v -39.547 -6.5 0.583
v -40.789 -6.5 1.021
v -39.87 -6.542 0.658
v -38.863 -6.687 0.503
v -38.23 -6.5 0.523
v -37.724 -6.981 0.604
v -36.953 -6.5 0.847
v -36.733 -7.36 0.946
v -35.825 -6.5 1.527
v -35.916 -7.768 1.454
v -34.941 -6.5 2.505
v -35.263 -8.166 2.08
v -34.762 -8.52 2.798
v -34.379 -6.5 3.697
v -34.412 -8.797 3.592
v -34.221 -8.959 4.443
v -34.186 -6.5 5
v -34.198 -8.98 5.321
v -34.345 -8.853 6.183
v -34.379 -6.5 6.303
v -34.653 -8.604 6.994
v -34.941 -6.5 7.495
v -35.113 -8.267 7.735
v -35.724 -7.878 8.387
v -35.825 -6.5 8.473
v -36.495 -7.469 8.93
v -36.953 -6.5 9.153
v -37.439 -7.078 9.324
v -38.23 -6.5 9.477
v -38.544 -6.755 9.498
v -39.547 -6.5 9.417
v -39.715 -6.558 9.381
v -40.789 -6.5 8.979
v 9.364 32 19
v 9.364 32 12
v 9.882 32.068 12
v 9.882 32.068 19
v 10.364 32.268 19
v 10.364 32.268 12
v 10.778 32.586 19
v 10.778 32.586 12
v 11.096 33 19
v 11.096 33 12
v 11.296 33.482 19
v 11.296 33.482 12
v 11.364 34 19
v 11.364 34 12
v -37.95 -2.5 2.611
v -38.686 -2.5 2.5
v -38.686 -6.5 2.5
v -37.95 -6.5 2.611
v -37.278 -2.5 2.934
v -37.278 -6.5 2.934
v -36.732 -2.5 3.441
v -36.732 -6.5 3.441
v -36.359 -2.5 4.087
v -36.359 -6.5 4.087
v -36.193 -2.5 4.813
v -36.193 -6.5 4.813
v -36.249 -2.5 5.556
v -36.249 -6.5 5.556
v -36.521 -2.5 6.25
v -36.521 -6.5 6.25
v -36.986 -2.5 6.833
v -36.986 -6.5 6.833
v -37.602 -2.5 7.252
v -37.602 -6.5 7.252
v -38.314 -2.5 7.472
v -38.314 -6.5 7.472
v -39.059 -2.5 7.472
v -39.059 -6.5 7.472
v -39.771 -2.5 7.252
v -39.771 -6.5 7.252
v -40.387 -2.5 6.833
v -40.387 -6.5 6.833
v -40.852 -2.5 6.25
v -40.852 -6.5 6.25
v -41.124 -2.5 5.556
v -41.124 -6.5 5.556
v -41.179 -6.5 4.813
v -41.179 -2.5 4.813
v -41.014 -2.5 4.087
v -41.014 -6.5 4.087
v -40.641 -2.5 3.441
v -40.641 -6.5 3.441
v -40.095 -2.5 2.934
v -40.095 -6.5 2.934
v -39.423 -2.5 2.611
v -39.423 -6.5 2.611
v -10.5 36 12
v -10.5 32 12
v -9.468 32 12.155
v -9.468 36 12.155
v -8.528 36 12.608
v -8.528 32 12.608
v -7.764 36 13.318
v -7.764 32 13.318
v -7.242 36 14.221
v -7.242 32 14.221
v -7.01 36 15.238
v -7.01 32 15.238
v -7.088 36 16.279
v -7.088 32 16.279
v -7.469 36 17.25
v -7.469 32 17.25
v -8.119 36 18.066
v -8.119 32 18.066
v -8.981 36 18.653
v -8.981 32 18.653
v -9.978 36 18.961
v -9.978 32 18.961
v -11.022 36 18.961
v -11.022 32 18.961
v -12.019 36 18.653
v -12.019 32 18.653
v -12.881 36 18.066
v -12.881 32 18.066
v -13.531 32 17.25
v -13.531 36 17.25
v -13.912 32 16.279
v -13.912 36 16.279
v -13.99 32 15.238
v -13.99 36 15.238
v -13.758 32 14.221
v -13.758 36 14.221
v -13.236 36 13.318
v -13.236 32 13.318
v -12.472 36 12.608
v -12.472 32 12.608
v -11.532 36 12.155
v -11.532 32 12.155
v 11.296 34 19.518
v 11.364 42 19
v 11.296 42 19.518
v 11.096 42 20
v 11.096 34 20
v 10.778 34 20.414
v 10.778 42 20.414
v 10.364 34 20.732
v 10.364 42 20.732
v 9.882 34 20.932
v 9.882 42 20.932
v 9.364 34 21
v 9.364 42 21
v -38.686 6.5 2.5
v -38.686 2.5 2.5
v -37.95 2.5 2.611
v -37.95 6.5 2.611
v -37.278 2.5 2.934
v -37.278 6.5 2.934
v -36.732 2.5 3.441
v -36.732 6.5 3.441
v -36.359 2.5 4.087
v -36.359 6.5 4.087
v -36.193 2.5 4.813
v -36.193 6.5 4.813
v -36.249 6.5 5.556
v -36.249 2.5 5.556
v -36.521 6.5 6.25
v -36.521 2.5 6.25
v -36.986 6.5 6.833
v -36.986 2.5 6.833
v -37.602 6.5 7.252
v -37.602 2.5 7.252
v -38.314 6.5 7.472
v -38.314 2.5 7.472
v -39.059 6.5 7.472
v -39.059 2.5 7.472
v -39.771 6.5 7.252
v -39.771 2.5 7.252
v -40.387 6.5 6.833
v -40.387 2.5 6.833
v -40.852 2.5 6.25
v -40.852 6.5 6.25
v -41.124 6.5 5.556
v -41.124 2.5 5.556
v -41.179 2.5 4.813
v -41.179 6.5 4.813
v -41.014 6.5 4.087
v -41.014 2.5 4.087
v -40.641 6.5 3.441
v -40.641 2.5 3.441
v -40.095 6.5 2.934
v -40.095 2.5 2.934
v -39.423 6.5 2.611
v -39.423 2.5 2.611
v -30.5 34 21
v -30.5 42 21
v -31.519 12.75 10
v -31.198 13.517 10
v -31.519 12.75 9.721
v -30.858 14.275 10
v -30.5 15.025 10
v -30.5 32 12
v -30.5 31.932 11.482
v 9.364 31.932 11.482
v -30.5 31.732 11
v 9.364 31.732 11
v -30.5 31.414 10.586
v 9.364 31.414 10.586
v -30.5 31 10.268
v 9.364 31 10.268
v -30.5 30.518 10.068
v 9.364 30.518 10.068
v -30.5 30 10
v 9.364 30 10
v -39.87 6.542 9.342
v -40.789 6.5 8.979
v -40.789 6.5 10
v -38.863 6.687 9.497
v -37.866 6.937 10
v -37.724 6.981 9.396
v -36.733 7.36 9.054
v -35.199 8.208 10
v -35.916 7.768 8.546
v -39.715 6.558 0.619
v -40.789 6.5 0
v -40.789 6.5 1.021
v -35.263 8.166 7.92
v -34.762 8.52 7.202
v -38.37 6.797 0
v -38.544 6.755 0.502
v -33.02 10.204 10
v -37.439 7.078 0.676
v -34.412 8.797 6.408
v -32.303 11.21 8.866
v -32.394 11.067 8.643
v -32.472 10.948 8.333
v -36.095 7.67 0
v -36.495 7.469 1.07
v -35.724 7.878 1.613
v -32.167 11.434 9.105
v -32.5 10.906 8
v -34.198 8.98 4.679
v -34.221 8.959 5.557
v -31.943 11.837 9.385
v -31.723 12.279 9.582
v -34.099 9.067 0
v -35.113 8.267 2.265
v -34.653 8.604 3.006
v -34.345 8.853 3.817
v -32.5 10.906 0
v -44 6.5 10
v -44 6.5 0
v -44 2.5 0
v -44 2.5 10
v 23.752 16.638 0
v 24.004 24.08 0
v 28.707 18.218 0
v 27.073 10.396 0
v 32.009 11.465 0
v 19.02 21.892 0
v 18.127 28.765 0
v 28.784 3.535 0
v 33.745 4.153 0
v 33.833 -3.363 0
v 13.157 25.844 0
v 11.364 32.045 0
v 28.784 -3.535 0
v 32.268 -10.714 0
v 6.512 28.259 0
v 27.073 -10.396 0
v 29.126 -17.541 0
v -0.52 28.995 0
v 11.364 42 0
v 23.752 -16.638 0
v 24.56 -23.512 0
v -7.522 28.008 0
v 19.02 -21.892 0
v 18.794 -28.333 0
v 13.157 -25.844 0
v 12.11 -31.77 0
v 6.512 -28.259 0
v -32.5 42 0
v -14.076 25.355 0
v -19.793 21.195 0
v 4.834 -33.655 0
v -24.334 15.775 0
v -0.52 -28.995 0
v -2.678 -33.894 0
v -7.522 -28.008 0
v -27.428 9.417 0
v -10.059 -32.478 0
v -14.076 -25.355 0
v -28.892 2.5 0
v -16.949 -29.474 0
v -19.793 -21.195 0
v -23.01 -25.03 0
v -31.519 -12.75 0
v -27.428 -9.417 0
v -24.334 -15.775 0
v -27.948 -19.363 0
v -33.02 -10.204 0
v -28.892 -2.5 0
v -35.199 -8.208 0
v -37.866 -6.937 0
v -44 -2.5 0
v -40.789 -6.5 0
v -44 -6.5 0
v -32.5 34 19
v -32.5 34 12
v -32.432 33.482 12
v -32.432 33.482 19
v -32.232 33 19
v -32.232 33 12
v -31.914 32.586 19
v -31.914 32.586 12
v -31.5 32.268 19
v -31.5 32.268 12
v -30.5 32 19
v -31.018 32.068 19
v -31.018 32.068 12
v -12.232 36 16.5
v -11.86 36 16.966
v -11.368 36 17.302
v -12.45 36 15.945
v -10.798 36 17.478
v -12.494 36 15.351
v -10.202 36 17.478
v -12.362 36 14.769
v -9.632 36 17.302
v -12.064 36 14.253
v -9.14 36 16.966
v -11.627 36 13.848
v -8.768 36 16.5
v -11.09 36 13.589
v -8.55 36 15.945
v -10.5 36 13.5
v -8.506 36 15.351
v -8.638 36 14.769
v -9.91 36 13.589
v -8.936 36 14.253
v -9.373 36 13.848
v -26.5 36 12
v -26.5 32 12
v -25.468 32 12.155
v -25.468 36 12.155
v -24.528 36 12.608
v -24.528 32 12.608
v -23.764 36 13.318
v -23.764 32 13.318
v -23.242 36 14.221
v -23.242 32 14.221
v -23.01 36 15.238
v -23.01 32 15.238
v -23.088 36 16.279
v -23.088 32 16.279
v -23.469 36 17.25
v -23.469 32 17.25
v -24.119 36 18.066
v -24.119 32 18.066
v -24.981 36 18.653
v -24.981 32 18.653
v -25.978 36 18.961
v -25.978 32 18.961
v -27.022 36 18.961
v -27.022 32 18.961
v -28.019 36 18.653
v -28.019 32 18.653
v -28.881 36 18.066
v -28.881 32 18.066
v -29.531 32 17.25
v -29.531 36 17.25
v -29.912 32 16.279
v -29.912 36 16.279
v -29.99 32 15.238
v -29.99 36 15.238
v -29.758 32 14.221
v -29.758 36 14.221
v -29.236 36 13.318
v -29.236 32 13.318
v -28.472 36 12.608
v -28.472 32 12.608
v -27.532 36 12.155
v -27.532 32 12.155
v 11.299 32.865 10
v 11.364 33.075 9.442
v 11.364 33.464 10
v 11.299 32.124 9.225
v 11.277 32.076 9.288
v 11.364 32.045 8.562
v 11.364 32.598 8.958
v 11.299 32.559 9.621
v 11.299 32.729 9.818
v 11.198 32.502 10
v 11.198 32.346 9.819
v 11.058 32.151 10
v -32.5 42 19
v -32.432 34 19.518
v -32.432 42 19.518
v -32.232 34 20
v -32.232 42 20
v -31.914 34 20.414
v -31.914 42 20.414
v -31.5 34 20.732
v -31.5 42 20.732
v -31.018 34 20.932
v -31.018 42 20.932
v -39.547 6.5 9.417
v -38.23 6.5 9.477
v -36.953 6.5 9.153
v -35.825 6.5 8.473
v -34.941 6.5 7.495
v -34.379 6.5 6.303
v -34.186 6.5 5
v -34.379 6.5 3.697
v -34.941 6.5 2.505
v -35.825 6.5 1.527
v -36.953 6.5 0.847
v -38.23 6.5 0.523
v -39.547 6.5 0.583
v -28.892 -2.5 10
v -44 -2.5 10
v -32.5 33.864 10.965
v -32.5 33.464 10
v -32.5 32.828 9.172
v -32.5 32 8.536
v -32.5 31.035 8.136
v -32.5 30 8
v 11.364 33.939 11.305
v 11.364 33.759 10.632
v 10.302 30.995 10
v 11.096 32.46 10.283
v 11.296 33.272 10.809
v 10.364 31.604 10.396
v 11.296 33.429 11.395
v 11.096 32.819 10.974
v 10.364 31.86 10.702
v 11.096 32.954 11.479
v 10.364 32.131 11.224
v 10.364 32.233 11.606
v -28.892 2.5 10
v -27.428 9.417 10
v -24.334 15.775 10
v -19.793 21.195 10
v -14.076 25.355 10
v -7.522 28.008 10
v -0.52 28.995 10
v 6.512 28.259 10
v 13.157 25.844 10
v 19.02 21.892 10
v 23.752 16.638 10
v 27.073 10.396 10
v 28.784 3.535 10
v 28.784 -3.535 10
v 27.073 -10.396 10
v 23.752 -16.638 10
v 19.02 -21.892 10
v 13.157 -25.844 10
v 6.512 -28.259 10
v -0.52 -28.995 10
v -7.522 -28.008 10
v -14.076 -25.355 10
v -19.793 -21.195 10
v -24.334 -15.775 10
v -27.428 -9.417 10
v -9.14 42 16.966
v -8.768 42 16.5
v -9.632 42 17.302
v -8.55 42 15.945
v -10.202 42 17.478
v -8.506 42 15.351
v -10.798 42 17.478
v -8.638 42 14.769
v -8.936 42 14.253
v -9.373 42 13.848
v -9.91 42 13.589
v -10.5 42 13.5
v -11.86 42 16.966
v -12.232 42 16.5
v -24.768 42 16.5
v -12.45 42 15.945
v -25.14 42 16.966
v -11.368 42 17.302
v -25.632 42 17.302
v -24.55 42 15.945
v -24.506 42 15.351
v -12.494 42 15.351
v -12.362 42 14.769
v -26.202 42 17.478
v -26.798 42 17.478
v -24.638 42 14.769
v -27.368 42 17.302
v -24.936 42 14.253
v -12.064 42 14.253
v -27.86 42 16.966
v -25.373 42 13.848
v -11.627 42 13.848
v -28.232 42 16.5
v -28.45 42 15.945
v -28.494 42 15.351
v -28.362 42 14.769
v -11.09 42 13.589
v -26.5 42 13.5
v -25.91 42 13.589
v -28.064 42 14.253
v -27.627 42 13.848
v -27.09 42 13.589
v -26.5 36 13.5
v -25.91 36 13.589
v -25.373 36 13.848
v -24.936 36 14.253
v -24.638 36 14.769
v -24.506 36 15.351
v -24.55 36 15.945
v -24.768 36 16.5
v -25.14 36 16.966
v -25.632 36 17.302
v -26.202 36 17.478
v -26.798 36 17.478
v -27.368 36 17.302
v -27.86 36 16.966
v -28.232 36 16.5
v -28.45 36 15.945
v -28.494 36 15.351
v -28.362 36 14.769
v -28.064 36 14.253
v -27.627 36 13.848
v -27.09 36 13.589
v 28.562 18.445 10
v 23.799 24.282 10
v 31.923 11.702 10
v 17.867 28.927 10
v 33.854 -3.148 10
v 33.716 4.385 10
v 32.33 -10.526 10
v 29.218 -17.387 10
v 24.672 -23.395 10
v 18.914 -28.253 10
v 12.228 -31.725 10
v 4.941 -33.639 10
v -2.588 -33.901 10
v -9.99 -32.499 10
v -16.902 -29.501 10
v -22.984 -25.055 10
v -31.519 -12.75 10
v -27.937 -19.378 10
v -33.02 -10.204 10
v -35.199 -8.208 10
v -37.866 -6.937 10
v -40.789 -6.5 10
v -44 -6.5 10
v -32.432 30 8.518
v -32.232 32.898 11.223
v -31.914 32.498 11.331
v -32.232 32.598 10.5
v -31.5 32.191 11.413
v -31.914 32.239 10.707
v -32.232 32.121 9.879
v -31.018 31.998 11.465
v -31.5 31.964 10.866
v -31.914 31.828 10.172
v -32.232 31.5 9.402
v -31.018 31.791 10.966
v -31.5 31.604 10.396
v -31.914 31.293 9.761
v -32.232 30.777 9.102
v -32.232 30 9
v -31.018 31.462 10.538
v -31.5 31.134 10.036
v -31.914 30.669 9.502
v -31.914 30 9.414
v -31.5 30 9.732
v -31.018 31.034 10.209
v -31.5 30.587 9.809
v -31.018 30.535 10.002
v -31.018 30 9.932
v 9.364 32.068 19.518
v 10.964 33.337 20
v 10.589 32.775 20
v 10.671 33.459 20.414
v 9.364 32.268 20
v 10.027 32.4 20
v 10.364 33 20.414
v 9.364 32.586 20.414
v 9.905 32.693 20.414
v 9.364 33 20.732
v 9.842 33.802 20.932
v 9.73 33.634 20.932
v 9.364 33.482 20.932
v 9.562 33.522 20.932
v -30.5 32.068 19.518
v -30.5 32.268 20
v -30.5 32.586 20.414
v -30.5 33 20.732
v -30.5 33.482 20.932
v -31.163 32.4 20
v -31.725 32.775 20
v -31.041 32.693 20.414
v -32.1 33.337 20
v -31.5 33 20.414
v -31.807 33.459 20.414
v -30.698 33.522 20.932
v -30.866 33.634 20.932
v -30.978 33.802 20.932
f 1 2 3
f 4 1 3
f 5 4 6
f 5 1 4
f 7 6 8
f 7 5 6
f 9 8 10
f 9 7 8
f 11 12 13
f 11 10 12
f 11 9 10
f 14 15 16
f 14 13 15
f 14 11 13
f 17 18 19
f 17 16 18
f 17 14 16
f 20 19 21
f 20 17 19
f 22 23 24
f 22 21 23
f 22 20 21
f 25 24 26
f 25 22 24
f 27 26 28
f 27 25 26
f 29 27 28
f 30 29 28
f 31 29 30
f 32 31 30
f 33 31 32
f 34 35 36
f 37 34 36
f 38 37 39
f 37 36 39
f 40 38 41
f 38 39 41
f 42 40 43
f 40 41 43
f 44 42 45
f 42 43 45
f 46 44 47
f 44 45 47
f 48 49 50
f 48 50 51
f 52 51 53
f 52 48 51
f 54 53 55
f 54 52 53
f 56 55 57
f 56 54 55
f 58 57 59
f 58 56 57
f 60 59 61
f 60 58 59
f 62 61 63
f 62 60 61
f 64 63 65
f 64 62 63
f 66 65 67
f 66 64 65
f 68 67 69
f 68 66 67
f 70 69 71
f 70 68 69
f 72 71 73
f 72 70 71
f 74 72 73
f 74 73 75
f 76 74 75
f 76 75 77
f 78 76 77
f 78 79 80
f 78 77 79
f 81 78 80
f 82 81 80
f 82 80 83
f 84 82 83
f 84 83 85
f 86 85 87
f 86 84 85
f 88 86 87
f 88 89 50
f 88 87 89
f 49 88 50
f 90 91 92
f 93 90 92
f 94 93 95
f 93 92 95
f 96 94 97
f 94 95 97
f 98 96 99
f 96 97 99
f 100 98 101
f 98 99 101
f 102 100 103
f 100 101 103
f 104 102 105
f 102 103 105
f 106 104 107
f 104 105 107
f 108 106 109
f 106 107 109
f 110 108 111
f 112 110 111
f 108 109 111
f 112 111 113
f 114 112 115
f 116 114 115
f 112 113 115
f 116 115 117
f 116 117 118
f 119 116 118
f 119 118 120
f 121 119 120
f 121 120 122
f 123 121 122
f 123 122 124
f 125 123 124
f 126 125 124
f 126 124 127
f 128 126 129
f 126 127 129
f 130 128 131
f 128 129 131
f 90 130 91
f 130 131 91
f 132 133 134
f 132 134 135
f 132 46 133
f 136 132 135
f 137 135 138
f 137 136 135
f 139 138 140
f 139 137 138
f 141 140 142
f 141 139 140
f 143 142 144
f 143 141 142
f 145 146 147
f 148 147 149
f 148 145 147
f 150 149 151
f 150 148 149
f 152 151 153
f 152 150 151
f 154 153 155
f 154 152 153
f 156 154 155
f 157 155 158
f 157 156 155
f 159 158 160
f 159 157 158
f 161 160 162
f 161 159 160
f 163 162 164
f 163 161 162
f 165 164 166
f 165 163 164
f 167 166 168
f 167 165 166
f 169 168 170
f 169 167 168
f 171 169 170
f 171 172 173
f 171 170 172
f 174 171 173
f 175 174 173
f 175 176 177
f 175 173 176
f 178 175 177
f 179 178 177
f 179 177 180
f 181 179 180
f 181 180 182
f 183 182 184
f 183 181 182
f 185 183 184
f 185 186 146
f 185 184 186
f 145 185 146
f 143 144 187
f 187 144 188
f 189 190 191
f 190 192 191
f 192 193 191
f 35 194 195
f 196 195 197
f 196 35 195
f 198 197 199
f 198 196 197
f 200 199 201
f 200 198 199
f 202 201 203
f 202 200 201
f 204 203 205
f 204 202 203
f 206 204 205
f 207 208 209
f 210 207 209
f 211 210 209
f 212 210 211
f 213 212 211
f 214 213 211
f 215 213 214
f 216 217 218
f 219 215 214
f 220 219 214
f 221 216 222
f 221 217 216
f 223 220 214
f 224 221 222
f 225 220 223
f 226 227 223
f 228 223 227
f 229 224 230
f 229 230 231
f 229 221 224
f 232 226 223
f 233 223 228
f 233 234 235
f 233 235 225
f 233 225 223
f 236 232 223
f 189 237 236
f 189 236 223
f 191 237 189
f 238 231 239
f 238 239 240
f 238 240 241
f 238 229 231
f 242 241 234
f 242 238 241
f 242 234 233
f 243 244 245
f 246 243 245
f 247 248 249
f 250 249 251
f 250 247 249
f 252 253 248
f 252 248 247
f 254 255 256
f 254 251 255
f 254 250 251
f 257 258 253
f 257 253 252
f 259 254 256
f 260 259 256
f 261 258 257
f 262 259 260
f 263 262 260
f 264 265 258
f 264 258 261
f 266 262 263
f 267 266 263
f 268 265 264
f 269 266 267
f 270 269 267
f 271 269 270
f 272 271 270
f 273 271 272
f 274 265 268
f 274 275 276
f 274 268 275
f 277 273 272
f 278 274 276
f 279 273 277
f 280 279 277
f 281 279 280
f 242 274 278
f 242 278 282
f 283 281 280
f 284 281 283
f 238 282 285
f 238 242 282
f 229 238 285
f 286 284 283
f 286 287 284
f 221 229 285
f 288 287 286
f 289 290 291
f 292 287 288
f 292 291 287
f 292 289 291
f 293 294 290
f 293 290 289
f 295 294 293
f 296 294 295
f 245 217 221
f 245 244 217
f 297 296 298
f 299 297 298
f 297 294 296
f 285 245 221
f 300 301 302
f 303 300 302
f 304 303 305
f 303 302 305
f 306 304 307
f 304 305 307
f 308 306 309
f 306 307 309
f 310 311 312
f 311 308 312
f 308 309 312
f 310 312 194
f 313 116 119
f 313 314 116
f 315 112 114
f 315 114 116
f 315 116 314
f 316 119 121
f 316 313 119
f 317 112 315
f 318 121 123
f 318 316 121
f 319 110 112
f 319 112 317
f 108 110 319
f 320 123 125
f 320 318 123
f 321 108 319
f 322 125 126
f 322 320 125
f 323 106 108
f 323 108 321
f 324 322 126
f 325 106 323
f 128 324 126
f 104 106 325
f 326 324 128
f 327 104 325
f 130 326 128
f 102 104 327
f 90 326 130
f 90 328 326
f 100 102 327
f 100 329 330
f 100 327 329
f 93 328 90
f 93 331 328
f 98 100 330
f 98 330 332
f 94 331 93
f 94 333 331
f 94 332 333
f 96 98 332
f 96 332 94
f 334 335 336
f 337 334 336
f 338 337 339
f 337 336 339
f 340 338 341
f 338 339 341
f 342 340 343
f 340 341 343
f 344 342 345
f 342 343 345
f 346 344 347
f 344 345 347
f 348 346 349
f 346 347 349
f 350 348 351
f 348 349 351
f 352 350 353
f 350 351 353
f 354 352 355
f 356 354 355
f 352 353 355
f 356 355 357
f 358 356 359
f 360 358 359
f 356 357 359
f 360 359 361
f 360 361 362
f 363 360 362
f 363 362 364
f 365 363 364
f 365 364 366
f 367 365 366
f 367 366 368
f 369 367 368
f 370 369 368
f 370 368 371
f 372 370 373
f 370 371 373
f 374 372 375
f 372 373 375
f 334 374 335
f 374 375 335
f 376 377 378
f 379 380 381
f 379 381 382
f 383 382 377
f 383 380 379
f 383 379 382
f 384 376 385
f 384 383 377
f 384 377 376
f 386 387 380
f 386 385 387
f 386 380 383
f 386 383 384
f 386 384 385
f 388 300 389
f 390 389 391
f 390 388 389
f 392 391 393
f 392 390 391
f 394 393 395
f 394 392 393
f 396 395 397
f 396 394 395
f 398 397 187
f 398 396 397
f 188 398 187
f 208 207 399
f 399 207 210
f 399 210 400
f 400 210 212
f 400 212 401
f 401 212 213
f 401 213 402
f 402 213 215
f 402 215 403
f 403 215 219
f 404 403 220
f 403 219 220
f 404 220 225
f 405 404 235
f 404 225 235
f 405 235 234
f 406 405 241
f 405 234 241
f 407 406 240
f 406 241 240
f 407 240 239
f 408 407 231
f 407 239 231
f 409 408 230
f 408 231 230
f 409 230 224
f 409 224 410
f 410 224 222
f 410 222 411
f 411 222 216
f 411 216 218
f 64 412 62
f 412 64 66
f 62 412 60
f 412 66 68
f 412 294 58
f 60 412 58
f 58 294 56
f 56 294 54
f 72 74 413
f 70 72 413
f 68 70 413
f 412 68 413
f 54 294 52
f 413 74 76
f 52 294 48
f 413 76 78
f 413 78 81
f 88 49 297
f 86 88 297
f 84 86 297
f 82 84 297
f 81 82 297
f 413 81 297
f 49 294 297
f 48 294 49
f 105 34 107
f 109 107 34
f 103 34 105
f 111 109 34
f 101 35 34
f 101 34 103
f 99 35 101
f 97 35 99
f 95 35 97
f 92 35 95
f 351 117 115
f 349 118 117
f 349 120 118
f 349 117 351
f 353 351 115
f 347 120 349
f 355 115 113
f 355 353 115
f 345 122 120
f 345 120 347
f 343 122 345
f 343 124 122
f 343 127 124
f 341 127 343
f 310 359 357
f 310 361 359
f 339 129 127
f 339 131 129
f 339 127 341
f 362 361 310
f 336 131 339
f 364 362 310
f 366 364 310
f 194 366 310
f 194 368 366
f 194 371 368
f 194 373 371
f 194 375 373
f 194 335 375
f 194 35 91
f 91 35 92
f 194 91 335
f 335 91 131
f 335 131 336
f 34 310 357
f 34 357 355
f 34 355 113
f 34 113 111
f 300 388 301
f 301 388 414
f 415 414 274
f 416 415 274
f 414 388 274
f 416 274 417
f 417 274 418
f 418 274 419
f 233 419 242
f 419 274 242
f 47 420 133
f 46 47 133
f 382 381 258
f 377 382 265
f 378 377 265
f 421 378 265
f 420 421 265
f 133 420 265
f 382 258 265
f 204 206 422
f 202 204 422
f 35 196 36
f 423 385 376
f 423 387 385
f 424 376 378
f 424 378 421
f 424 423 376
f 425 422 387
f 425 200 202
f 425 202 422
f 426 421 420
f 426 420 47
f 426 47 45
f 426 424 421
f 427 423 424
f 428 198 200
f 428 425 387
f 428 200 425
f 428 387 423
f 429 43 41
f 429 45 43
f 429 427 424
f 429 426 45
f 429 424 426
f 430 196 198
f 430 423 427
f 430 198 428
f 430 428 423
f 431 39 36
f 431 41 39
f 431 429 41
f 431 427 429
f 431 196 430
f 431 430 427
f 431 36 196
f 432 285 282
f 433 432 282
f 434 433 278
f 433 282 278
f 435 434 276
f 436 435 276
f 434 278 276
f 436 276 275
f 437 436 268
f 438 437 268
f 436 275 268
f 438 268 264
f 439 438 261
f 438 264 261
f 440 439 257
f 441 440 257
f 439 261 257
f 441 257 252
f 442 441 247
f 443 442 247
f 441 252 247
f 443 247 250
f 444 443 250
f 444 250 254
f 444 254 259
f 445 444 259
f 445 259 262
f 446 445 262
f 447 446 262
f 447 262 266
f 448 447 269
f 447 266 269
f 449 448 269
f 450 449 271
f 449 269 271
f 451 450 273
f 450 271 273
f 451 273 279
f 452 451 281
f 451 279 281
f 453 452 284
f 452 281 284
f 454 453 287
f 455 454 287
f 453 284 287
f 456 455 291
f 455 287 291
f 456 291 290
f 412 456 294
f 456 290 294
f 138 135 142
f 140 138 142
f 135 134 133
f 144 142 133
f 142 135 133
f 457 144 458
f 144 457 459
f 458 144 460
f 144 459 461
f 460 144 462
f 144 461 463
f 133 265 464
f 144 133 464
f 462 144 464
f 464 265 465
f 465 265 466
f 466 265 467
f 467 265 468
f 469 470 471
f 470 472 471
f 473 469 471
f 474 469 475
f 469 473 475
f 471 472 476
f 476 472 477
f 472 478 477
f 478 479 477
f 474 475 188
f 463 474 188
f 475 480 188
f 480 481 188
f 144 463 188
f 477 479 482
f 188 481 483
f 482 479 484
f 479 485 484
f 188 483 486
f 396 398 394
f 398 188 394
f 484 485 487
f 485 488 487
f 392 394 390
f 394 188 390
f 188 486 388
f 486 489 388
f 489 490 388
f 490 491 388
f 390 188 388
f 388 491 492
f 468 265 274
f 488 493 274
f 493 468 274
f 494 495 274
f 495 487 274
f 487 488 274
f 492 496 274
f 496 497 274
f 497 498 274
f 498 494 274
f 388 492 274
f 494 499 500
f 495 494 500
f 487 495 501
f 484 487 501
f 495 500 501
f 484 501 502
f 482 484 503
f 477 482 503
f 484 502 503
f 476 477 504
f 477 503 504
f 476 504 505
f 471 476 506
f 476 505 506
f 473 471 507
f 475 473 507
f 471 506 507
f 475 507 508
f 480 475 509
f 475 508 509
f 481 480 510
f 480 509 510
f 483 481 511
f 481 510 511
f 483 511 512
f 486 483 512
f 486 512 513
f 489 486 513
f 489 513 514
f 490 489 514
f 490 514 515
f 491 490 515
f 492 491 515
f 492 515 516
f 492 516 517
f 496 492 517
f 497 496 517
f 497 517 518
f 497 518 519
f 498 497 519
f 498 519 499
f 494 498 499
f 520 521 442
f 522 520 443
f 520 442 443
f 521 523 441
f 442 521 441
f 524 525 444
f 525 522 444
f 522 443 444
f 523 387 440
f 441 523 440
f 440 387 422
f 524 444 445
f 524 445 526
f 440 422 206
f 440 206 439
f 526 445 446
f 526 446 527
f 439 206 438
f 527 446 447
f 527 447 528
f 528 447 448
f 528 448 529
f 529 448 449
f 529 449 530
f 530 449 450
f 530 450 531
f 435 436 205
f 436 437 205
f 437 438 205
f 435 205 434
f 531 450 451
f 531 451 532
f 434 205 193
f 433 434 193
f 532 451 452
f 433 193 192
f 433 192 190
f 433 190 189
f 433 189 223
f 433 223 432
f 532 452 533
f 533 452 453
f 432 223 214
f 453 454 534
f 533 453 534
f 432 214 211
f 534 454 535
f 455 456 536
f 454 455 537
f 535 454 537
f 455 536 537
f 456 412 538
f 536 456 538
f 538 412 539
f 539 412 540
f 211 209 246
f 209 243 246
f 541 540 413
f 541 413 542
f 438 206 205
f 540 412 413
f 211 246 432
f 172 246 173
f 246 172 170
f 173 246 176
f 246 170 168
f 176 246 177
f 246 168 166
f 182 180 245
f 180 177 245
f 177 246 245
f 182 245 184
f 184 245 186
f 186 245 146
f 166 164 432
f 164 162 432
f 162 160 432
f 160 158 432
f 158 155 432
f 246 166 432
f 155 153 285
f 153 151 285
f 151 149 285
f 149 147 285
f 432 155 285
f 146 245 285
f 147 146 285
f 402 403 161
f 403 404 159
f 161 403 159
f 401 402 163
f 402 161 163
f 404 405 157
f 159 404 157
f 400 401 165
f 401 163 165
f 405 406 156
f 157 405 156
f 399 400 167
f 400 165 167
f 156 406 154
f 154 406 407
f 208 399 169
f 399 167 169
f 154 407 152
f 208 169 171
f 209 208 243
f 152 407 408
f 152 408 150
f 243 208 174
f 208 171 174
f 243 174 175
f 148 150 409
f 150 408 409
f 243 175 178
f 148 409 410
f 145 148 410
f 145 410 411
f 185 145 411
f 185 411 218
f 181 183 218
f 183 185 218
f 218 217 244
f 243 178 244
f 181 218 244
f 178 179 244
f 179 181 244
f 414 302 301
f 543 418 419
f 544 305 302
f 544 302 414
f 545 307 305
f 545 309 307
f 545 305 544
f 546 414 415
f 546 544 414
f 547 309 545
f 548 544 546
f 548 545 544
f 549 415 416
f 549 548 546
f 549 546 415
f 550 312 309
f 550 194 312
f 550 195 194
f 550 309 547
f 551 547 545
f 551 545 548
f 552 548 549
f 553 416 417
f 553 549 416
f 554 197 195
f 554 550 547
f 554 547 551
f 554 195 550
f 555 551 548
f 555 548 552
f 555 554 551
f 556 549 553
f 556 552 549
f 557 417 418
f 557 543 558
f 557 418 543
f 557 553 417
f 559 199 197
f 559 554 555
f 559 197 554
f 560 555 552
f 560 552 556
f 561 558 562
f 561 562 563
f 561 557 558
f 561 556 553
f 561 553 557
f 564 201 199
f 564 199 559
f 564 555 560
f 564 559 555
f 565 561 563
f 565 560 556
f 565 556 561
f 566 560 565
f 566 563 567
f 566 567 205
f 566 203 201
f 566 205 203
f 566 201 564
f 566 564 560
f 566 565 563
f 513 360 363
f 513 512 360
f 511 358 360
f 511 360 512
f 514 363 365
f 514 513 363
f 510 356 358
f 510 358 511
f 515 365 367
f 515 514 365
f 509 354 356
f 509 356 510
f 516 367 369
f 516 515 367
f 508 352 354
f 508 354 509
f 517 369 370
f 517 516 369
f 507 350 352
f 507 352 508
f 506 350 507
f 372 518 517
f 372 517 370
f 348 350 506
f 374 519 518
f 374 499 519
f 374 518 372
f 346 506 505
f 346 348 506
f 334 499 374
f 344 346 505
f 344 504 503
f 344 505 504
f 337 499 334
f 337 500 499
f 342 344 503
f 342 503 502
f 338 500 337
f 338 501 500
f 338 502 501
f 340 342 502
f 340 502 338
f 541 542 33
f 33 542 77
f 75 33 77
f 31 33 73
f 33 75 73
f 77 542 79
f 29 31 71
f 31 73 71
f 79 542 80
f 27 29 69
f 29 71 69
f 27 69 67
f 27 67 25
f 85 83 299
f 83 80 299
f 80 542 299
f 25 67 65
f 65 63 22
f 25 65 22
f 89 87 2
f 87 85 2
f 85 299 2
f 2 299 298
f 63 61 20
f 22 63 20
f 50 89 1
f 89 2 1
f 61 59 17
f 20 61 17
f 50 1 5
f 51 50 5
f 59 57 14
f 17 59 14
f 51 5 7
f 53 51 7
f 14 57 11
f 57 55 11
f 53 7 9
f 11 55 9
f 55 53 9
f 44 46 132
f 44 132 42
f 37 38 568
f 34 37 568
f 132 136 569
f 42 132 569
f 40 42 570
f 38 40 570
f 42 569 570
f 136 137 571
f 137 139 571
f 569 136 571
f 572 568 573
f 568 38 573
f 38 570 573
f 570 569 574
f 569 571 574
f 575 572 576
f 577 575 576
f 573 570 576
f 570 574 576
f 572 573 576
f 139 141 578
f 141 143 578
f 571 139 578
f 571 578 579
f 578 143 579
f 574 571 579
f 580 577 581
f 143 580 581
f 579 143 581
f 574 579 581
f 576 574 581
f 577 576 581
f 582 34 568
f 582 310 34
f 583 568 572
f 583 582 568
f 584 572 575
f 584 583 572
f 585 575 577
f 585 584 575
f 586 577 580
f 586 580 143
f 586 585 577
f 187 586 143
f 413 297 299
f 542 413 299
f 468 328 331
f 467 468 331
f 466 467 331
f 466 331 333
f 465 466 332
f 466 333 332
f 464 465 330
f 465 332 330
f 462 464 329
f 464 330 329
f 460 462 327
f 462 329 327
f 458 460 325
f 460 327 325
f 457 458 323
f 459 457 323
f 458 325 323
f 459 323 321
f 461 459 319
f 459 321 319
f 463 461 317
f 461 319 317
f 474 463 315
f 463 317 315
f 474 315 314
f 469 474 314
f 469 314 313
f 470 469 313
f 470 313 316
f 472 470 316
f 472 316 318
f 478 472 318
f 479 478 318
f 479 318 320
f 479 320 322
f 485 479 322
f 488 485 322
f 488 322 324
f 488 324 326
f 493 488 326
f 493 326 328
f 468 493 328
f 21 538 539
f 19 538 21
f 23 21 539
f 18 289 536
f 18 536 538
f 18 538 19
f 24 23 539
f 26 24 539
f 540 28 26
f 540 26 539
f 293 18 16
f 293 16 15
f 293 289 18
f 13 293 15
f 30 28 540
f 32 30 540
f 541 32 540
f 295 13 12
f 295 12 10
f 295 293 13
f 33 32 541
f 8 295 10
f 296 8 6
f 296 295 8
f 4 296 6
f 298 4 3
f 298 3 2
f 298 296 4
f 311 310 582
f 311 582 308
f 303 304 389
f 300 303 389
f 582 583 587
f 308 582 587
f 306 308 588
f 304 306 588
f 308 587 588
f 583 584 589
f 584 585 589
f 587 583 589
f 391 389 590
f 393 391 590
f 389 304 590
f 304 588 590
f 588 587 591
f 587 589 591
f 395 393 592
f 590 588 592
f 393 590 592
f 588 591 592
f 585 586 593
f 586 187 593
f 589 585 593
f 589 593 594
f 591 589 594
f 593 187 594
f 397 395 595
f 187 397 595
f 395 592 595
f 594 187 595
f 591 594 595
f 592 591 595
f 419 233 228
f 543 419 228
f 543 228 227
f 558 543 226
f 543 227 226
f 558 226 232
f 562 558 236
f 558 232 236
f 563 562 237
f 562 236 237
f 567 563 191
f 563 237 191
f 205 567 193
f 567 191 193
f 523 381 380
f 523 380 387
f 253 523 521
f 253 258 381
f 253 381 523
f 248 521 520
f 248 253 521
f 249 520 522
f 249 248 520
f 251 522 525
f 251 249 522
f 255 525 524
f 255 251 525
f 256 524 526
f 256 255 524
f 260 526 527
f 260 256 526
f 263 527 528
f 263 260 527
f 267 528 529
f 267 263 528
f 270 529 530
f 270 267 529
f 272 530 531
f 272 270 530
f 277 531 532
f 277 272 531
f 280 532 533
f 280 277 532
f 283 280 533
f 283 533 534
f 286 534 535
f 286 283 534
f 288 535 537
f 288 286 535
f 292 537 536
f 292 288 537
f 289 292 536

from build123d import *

# Parameters (mm, degrees)
BOSS_EXTRUDE3_DEPTH     = 10
SKETCH3_W               = 43.8640004
SKETCH3_H               = 10
BOSS_EXTRUDE4_DEPTH     = 21
SKETCH4_R               = 2
CUT_EXTRUDE1_DEPTH      = 83.054859698
SKETCH5_R               = 3.5
CUT_EXTRUDE2_DEPTH      = 4
FILLET1_R               = 2
FILLET2_R               = 2
FILLET3_R               = 2
FILLET4_R               = 2
CUT_EXTRUDE3_DEPTH      = 69.769542741
CUT_EXTRUDE3_DEPTH_BACK = 69.769542741
SKETCH6_R               = 2.5
FILLET5_R               = 10
FILLET6_R               = 10
SKETCH7_R               = 4.5
CUT_EXTRUDE4_DEPTH      = 10
CUT_EXTRUDE5_START      = 10
SKETCH8_R               = 4.5
CUT_EXTRUDE5_DEPTH      = 10


# Some blends are built 0.0001 mm under size
with BuildPart() as part:
    # Sketch2 → Boss-Extrude3 (new body)
    with BuildSketch(Plane.XY):
        with BuildLine():
            Line((-44, -2.5), (-44, -6.5))
            Line((-44, -6.5), (-33.372893192, -6.5))
            ThreePointArc((-33.372893192, -6.5), (22.19279887, -25.758099276), (11.3640004, 32.04464846))
            Line((11.3640004, 32.04464846), (11.3640004, 42))
            Line((11.3640004, 42), (-32.5, 42))
            Line((-32.5, 42), (-32.5, 9.987492178))
            ThreePointArc((-32.5, 9.987492178), (-32.982573653, 8.255291346), (-33.372893192, 6.5))
            Line((-33.372893192, 6.5), (-44, 6.5))
            Line((-44, 6.5), (-44, 2.5))
            Line((-44, 2.5), (-28.892040426, 2.5))
            ThreePointArc((-28.892040426, 2.5), (29, 0), (-28.892040426, -2.5))
            Line((-28.892040426, -2.5), (-44, -2.5))
        make_face()
    extrude(amount=BOSS_EXTRUDE3_DEPTH)

    # Sketch3 → Boss-Extrude4 (add)
    with BuildSketch(Plane(origin=(0, 0, 0), x_dir=(-1, 0, 0), z_dir=(0, 0, -1))):
        with Locations((10.5679998, 37)):
            Rectangle(SKETCH3_W, SKETCH3_H)
    extrude(amount=-BOSS_EXTRUDE4_DEPTH)

    # Sketch4 → Cut-Extrude1 (cut, through all)
    with BuildSketch(Plane.XZ.offset(-32)):
        with Locations(Location((-26.5, 15.5, 0), (0, 0, 270))):
            Circle(SKETCH4_R)
        with Locations(Location((-10.5, 15.5, 0), (0, 0, 270))):
            Circle(SKETCH4_R)
    extrude(amount=-CUT_EXTRUDE1_DEPTH, mode=Mode.SUBTRACT)

    # Sketch5 → Cut-Extrude2 (cut)
    with BuildSketch(Plane.XZ.offset(-32)):
        with Locations(Location((-26.5, 15.5, 0), (0, 0, 270))):
            Circle(SKETCH5_R)
        with Locations(Location((-10.5, 15.5, 0), (0, 0, 270))):
            Circle(SKETCH5_R)
    extrude(amount=-CUT_EXTRUDE2_DEPTH, mode=Mode.SUBTRACT)

    # Fillet1
    fillet1_edges = [part.edges().sort_by_distance(p)[0] for p in [
        (-10.5679998, 32, 10),
    ]]
    fillet(fillet1_edges, radius=FILLET1_R - 0.0001)  # a hair under: the kernel refuses the full size

    # Fillet2
    # the kernel refuses this fillet: 2 mm, written as the material it takes off along each edge
    with BuildSketch(Plane(origin=(11.3640004, 30.0001, 11.9999), x_dir=(0, -0.597567009658115, 0.8018189751859569), z_dir=(0, 0.8018189751859569, 0.597567009658115))) as fillet2_piece_1_section:
        with BuildLine():
            CenterArc((1.9999 + FILLET2_R, -FILLET2_R), FILLET2_R, 90, 90)
            Line((1.9999 + FILLET2_R, 0), (1.9999, 0))
            Line((1.9999, 0), (1.9999, -FILLET2_R))
        make_face()
    fillet2_piece_1 = revolve(axis=Axis((11.3640004, 30.0001, 11.9999), (1, 0, 0)), revolution_arc=233.304154445, mode=Mode.PRIVATE)
    fillet2_piece_1 = split(fillet2_piece_1, bisect_by=Plane(origin=(10.740737353, 31.499904871, 10), z_dir=(0, 0, 1)), keep=Keep.TOP, mode=Mode.PRIVATE)
    add(fillet2_piece_1, mode=Mode.SUBTRACT)
    with BuildSketch(Plane(origin=(11.3640004, 30.0001, 11.9999), x_dir=(0, -0.597567009658115, 0.8018189751859569), z_dir=(0, 0.8018189751859569, 0.597567009658115))) as fillet2_piece_2_section:
        with BuildLine():
            CenterArc((1.9999 + FILLET2_R, -FILLET2_R), FILLET2_R, 90, 90)
            Line((1.9999 + FILLET2_R, 0), (1.9999, 0))
            Line((1.9999, 0), (1.9999, -FILLET2_R))
        make_face()
    fillet2_piece_2 = revolve(axis=Axis((11.3640004, 30.0001, 11.9999), (1, 0, 0)), revolution_arc=233.304154445, mode=Mode.PRIVATE)
    fillet2_piece_2 = fillet2_piece_2 - Plane(origin=(0, 0, 9.683888081), x_dir=(-0.9815556821156025, -0.19117647058823523, 0), z_dir=(0, 0, -1)) * Cylinder(34, 16, mode=Mode.PRIVATE)
    add(fillet2_piece_2, mode=Mode.SUBTRACT)
    with BuildSketch(Plane(origin=(11.3640004, 32, 11.9999), x_dir=(-1, 0, 0), z_dir=(0, 0, 1))) as fillet2_piece_3:
        with BuildLine():
            CenterArc((FILLET2_R, -FILLET2_R), FILLET2_R, 90, 90)
            Line((0, -FILLET2_R), (0, 0))
            Line((0, 0), (FILLET2_R, 0))
        make_face()
    extrude(amount=14.0001, mode=Mode.SUBTRACT)

    # Fillet3
    fillet3_edges = [part.edges().sort_by_distance(p)[0] for p in [
        (-32.5, 31.414242852, 10.585757148),
        (-32.5, 19.993796089, 10),
        (-32.5, 32, 16.49995),
    ]]
    fillet(fillet3_edges, radius=FILLET3_R)

    # Fillet4
    fillet4_edges = [part.edges().sort_by_distance(p)[0] for p in [
        (-10.5679998, 32, 21),
        (10.778213962, 32.585786438, 21),
        (-32.5, 38, 21),
        (-31.914213562, 32.585786438, 21),
        (11.3640004, 38, 21),
    ]]
    fillet(fillet4_edges, radius=FILLET4_R - 0.0001)  # a hair under: the kernel refuses the full size

    # Sketch6 → Cut-Extrude3 (cut, two sides: drawn at the far end of the back side and taken through both)
    with BuildSketch(Plane.XZ.offset(6.5).offset(-CUT_EXTRUDE3_DEPTH_BACK)):
        with Locations(Location((-38.686446596, 5, 0), (0, 0, 270))):
            Circle(SKETCH6_R)
    extrude(amount=CUT_EXTRUDE3_DEPTH + CUT_EXTRUDE3_DEPTH_BACK, mode=Mode.SUBTRACT)

    # Fillet5
    # the kernel refuses this fillet: 10 mm, written as the material it adds along each edge
    with BuildSketch(Plane(origin=(-33.372893192, -6.5, 0), x_dir=(0.28439822949725985, -0.9587062360592132, 0), z_dir=(0, 0, 1))) as fillet5_piece_1_section:
        with BuildLine():
            CenterArc((7.477908641, -9.953938032), FILLET5_R, 95.501431601, 67.975687163)
            Line((-2.109153719, -7.109955737), (0, 0))
            ThreePointArc((0, 0), (3.259601203, -0.15661069), (6.519202405, 0))
        make_face()
    fillet5_piece_1 = extrude(amount=10, mode=Mode.PRIVATE)
    fillet5_piece_1 = fillet5_piece_1 - Plane(origin=(-38.686446596, -7.980864668, 5), x_dir=(0, 0, -1), z_dir=(0, -1, 0)) * Cylinder(2.5, 49, mode=Mode.PRIVATE)
    add(fillet5_piece_1)

    # Fillet6
    # the kernel refuses this fillet: 10 mm, written as the material it adds along each edge
    with BuildSketch(Plane(origin=(-33.372893192, 6.5, 0), x_dir=(0.28439822949726035, 0.9587062360592132, 0), z_dir=(0, 0, 1))) as fillet6_piece_1_section:
        with BuildLine():
            CenterArc((7.477908641, 9.953938032), FILLET6_R, 196.522881236, 67.975687163)
            Line((-2.109153719, 7.109955737), (0, 0))
            ThreePointArc((0, 0), (3.259601203, 0.15661069), (6.519202405, 0))
        make_face()
    fillet6_piece_1 = extrude(amount=10, mode=Mode.PRIVATE)
    fillet6_piece_1 = fillet6_piece_1 - Plane(origin=(-38.686446596, 7.980864668, 5), x_dir=(0, 0, -1), z_dir=(0, -1, 0)) * Cylinder(2.5, 49, mode=Mode.PRIVATE)
    add(fillet6_piece_1)

    # Sketch7 → Cut-Extrude4 (cut)
    with BuildSketch(Plane.XZ.offset(6.5)):
        with Locations((-38.686446596, 5)):
            Circle(SKETCH7_R)
    extrude(amount=CUT_EXTRUDE4_DEPTH, mode=Mode.SUBTRACT)

    # Sketch8 → Cut-Extrude5 (cut)
    with BuildSketch(Plane(origin=(0, 6.5, 0), x_dir=(1, 0, 0), z_dir=(0, 1, 0)).offset(CUT_EXTRUDE5_START)):
        with Locations((-38.686446596, -5)):
            Circle(SKETCH8_R)
    extrude(amount=-CUT_EXTRUDE5_DEPTH, mode=Mode.SUBTRACT)


solid = part.part
